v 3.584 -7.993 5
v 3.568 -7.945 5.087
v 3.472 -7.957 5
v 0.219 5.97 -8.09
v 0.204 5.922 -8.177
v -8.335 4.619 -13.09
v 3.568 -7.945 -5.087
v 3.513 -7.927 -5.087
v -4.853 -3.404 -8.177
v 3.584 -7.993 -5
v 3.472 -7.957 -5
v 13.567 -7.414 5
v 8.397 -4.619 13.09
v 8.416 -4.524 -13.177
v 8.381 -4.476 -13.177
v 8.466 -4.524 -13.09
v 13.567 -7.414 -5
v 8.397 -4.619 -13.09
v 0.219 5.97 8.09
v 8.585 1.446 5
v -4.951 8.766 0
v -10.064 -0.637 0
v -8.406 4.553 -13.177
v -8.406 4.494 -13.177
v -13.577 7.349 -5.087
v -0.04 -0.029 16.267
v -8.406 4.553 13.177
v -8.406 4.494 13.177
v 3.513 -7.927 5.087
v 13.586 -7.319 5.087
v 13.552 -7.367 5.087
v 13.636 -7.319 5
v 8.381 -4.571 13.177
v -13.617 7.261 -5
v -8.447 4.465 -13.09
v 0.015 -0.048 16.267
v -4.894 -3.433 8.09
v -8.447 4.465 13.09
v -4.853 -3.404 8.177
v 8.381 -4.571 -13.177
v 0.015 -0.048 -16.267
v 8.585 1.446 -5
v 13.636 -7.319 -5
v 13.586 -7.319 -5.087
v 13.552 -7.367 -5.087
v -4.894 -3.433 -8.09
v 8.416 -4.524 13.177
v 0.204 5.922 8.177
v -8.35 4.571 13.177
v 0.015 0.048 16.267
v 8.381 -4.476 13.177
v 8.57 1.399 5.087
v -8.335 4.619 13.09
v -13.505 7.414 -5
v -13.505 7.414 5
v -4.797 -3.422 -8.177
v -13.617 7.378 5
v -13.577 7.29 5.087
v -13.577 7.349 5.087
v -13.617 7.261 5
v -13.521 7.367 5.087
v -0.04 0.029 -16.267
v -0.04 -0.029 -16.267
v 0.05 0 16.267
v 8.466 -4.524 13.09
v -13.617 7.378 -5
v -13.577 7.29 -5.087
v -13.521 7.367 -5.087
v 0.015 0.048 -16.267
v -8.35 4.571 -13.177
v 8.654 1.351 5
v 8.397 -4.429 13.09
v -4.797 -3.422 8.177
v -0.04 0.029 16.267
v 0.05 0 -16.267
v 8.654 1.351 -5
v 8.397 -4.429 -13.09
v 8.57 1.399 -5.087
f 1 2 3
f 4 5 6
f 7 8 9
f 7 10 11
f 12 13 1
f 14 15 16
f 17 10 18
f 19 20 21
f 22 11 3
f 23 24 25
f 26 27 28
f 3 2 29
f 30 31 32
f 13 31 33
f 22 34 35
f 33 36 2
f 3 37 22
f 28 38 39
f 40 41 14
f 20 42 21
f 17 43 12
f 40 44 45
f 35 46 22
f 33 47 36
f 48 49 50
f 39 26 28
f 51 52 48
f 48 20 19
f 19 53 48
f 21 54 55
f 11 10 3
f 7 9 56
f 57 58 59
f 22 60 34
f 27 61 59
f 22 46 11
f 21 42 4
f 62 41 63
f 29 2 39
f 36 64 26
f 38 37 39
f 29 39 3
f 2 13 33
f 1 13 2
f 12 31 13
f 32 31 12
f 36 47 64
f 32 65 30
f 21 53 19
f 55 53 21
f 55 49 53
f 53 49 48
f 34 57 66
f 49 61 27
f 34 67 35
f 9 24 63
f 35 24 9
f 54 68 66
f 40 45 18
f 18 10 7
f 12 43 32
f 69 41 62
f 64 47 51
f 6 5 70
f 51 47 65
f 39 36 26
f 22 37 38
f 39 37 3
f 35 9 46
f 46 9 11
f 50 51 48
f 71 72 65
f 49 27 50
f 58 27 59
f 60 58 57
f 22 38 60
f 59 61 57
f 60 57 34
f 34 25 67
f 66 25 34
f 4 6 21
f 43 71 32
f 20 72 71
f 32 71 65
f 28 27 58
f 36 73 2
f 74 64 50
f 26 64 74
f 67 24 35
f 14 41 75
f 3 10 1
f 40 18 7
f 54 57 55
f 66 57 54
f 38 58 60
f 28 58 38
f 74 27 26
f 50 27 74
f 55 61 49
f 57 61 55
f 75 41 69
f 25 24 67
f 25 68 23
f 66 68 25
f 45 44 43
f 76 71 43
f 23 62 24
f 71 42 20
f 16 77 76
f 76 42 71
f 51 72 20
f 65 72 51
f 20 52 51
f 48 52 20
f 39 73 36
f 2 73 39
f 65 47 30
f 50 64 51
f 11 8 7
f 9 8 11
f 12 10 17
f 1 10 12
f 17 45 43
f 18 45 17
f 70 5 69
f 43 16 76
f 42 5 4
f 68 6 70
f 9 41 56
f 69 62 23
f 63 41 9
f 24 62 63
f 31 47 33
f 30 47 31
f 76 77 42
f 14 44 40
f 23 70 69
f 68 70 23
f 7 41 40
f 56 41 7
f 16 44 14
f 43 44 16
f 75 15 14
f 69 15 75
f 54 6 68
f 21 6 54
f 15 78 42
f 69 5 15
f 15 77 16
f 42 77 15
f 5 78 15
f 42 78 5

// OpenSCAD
// Auto-generated OpenSCAD file

    inner_points = 10*[[-1.7845387792055995e-15, -1.859095349230593e-15, -1.618033988749895], [1.7845387792055995e-15, 1.859095349230593e-15, 1.618033988749895], [-1.3536265463755464, 0.7319352168718941, -0.49999999999999933], [-1.3536265463755455, 0.7319352168718953, 0.5000000000000007], [1.3536265463755455, -0.7319352168718953, -0.5000000000000007], [1.3536265463755464, -0.7319352168718941, 0.49999999999999933], [-0.8365872137342245, 0.45236084158985485, -1.309016994374947], [-0.8365872137342216, 0.4523608415898579, 1.309016994374948], [0.8365872137342216, -0.4523608415898579, -1.309016994374948], [0.8365872137342245, -0.45236084158985485, 1.309016994374947], [-0.9983252747658171, -0.0578502010692763, 1.1675275179479784e-15], [-0.49820742844767774, 0.8670578747924227, -4.467599515296164e-16], [-0.48128594212449544, -0.3374245763513155, -0.8090169943749466], [0.018831904193644222, 0.5874834995103835, -0.8090169943749481], [-0.4812859421244936, -0.3374245763513135, 0.8090169943749483], [0.018831904193646, 0.5874834995103853, 0.8090169943749468], [0.35530127160972824, -0.7897854179411714, -0.4999999999999995], [0.8554191179278678, 0.13512265792052747, -0.5000000000000011], [0.3553012716097293, -0.7897854179411703, 0.5000000000000006], [0.8554191179278688, 0.13512265792052863, 0.4999999999999989]];

    outer_points = 10*[[-1.4881280115199031, 0.0, -0.6352235906196446], [1.4881280115199031, 0.0, 0.6352235906196446], [-0.10491467048796077, -1.2452425677866739, -1.0278121657376647], [0.8147990202421345, -1.2452425677866739, -0.6352223962789754], [-0.8147990202421345, 1.2452425677866739, 0.6352223962789754], [0.10491467048796077, 1.2452425677866739, 1.0278121657376647], [-0.9845545230101506, -0.7696022311303593, -1.027812621935206], [1.423287179239848, -0.7696022311303593, 7.381431278430384e-07], [-1.423287179239848, 0.7696022311303593, -7.381431278430384e-07], [0.9845545230101506, 0.7696022311303593, 1.027812621935206], [0.36322496660595616, -0.37947419135933846, -0.8509212429633416], [0.029189450705503803, -0.9972321321950521, -0.06838165313313897], [-0.5164148859162335, 0.09616614529697598, -0.8509216991608831], [-0.8504504018166859, -0.5215917955387377, -0.06838210933068053], [0.9717131256036696, 0.09616614529697598, -0.2156981085412385], [0.6376776097032173, -0.5215917955387377, 0.566841481288964], [-0.45157405363617825, 0.8657683764273354, -0.21569884668436626], [-0.7856095695366306, 0.24801043559162173, 0.5668407431458362], [0.468139637093917, 0.8657683764273354, 0.17689092277432297], [0.1341041211934646, 0.24801043559162173, 0.9594305126045255]];

    // Convex hull for inner set (I)
    module inner_hull() {
        hull() {
            for (p = inner_points) {
                translate(p) sphere(r=0.1);
            }
        }
    }

    // Convex hull for outer set (O) minus inner hull (O \ I)
    module outer_minus_inner() {
        difference() {
            hull() {
                for (p = outer_points) {
                    translate(p) sphere(r=0.1);
                }
            }
            inner_hull(); // Subtract inner hull
        }
    }

    // Convex hull for outer set (O) minus all translated inner hulls
    module outer_minus_AllTranslationInner() {
        difference() {
            hull() {
                for (p = outer_points) {
                    translate(p) sphere(r=0.1);
                }
            }
            hull() {
                translate([0,0,50]) inner_hull();
                translate([0,0,-50]) inner_hull();
            }; // Subtract translated inner hulls
        }
    }

    // Difference between outer_minus_inner and outer_minus_AllTranslationInner
    module outer_minus_inner_diff() {
        difference() {
            // Outer minus inner
            difference() {
                hull() {
                    for (p = outer_points) {
                        translate(p) sphere(r=0.1);
                    }
                }
                inner_hull();
            }

            // Subtract Outer minus AllTranslationInner
            difference() {
                hull() {
                    for (p = outer_points) {
                        translate(p) sphere(r=0.1);
                    }
                }
                hull() {
                    translate([0,0,50]) inner_hull();
                    translate([0,0,-50]) inner_hull();
                };
            }
        }
    }

    // Rendering all with colors applied
    color([1, 0, 0, 0.5]) inner_hull(); // Transparent red
    
